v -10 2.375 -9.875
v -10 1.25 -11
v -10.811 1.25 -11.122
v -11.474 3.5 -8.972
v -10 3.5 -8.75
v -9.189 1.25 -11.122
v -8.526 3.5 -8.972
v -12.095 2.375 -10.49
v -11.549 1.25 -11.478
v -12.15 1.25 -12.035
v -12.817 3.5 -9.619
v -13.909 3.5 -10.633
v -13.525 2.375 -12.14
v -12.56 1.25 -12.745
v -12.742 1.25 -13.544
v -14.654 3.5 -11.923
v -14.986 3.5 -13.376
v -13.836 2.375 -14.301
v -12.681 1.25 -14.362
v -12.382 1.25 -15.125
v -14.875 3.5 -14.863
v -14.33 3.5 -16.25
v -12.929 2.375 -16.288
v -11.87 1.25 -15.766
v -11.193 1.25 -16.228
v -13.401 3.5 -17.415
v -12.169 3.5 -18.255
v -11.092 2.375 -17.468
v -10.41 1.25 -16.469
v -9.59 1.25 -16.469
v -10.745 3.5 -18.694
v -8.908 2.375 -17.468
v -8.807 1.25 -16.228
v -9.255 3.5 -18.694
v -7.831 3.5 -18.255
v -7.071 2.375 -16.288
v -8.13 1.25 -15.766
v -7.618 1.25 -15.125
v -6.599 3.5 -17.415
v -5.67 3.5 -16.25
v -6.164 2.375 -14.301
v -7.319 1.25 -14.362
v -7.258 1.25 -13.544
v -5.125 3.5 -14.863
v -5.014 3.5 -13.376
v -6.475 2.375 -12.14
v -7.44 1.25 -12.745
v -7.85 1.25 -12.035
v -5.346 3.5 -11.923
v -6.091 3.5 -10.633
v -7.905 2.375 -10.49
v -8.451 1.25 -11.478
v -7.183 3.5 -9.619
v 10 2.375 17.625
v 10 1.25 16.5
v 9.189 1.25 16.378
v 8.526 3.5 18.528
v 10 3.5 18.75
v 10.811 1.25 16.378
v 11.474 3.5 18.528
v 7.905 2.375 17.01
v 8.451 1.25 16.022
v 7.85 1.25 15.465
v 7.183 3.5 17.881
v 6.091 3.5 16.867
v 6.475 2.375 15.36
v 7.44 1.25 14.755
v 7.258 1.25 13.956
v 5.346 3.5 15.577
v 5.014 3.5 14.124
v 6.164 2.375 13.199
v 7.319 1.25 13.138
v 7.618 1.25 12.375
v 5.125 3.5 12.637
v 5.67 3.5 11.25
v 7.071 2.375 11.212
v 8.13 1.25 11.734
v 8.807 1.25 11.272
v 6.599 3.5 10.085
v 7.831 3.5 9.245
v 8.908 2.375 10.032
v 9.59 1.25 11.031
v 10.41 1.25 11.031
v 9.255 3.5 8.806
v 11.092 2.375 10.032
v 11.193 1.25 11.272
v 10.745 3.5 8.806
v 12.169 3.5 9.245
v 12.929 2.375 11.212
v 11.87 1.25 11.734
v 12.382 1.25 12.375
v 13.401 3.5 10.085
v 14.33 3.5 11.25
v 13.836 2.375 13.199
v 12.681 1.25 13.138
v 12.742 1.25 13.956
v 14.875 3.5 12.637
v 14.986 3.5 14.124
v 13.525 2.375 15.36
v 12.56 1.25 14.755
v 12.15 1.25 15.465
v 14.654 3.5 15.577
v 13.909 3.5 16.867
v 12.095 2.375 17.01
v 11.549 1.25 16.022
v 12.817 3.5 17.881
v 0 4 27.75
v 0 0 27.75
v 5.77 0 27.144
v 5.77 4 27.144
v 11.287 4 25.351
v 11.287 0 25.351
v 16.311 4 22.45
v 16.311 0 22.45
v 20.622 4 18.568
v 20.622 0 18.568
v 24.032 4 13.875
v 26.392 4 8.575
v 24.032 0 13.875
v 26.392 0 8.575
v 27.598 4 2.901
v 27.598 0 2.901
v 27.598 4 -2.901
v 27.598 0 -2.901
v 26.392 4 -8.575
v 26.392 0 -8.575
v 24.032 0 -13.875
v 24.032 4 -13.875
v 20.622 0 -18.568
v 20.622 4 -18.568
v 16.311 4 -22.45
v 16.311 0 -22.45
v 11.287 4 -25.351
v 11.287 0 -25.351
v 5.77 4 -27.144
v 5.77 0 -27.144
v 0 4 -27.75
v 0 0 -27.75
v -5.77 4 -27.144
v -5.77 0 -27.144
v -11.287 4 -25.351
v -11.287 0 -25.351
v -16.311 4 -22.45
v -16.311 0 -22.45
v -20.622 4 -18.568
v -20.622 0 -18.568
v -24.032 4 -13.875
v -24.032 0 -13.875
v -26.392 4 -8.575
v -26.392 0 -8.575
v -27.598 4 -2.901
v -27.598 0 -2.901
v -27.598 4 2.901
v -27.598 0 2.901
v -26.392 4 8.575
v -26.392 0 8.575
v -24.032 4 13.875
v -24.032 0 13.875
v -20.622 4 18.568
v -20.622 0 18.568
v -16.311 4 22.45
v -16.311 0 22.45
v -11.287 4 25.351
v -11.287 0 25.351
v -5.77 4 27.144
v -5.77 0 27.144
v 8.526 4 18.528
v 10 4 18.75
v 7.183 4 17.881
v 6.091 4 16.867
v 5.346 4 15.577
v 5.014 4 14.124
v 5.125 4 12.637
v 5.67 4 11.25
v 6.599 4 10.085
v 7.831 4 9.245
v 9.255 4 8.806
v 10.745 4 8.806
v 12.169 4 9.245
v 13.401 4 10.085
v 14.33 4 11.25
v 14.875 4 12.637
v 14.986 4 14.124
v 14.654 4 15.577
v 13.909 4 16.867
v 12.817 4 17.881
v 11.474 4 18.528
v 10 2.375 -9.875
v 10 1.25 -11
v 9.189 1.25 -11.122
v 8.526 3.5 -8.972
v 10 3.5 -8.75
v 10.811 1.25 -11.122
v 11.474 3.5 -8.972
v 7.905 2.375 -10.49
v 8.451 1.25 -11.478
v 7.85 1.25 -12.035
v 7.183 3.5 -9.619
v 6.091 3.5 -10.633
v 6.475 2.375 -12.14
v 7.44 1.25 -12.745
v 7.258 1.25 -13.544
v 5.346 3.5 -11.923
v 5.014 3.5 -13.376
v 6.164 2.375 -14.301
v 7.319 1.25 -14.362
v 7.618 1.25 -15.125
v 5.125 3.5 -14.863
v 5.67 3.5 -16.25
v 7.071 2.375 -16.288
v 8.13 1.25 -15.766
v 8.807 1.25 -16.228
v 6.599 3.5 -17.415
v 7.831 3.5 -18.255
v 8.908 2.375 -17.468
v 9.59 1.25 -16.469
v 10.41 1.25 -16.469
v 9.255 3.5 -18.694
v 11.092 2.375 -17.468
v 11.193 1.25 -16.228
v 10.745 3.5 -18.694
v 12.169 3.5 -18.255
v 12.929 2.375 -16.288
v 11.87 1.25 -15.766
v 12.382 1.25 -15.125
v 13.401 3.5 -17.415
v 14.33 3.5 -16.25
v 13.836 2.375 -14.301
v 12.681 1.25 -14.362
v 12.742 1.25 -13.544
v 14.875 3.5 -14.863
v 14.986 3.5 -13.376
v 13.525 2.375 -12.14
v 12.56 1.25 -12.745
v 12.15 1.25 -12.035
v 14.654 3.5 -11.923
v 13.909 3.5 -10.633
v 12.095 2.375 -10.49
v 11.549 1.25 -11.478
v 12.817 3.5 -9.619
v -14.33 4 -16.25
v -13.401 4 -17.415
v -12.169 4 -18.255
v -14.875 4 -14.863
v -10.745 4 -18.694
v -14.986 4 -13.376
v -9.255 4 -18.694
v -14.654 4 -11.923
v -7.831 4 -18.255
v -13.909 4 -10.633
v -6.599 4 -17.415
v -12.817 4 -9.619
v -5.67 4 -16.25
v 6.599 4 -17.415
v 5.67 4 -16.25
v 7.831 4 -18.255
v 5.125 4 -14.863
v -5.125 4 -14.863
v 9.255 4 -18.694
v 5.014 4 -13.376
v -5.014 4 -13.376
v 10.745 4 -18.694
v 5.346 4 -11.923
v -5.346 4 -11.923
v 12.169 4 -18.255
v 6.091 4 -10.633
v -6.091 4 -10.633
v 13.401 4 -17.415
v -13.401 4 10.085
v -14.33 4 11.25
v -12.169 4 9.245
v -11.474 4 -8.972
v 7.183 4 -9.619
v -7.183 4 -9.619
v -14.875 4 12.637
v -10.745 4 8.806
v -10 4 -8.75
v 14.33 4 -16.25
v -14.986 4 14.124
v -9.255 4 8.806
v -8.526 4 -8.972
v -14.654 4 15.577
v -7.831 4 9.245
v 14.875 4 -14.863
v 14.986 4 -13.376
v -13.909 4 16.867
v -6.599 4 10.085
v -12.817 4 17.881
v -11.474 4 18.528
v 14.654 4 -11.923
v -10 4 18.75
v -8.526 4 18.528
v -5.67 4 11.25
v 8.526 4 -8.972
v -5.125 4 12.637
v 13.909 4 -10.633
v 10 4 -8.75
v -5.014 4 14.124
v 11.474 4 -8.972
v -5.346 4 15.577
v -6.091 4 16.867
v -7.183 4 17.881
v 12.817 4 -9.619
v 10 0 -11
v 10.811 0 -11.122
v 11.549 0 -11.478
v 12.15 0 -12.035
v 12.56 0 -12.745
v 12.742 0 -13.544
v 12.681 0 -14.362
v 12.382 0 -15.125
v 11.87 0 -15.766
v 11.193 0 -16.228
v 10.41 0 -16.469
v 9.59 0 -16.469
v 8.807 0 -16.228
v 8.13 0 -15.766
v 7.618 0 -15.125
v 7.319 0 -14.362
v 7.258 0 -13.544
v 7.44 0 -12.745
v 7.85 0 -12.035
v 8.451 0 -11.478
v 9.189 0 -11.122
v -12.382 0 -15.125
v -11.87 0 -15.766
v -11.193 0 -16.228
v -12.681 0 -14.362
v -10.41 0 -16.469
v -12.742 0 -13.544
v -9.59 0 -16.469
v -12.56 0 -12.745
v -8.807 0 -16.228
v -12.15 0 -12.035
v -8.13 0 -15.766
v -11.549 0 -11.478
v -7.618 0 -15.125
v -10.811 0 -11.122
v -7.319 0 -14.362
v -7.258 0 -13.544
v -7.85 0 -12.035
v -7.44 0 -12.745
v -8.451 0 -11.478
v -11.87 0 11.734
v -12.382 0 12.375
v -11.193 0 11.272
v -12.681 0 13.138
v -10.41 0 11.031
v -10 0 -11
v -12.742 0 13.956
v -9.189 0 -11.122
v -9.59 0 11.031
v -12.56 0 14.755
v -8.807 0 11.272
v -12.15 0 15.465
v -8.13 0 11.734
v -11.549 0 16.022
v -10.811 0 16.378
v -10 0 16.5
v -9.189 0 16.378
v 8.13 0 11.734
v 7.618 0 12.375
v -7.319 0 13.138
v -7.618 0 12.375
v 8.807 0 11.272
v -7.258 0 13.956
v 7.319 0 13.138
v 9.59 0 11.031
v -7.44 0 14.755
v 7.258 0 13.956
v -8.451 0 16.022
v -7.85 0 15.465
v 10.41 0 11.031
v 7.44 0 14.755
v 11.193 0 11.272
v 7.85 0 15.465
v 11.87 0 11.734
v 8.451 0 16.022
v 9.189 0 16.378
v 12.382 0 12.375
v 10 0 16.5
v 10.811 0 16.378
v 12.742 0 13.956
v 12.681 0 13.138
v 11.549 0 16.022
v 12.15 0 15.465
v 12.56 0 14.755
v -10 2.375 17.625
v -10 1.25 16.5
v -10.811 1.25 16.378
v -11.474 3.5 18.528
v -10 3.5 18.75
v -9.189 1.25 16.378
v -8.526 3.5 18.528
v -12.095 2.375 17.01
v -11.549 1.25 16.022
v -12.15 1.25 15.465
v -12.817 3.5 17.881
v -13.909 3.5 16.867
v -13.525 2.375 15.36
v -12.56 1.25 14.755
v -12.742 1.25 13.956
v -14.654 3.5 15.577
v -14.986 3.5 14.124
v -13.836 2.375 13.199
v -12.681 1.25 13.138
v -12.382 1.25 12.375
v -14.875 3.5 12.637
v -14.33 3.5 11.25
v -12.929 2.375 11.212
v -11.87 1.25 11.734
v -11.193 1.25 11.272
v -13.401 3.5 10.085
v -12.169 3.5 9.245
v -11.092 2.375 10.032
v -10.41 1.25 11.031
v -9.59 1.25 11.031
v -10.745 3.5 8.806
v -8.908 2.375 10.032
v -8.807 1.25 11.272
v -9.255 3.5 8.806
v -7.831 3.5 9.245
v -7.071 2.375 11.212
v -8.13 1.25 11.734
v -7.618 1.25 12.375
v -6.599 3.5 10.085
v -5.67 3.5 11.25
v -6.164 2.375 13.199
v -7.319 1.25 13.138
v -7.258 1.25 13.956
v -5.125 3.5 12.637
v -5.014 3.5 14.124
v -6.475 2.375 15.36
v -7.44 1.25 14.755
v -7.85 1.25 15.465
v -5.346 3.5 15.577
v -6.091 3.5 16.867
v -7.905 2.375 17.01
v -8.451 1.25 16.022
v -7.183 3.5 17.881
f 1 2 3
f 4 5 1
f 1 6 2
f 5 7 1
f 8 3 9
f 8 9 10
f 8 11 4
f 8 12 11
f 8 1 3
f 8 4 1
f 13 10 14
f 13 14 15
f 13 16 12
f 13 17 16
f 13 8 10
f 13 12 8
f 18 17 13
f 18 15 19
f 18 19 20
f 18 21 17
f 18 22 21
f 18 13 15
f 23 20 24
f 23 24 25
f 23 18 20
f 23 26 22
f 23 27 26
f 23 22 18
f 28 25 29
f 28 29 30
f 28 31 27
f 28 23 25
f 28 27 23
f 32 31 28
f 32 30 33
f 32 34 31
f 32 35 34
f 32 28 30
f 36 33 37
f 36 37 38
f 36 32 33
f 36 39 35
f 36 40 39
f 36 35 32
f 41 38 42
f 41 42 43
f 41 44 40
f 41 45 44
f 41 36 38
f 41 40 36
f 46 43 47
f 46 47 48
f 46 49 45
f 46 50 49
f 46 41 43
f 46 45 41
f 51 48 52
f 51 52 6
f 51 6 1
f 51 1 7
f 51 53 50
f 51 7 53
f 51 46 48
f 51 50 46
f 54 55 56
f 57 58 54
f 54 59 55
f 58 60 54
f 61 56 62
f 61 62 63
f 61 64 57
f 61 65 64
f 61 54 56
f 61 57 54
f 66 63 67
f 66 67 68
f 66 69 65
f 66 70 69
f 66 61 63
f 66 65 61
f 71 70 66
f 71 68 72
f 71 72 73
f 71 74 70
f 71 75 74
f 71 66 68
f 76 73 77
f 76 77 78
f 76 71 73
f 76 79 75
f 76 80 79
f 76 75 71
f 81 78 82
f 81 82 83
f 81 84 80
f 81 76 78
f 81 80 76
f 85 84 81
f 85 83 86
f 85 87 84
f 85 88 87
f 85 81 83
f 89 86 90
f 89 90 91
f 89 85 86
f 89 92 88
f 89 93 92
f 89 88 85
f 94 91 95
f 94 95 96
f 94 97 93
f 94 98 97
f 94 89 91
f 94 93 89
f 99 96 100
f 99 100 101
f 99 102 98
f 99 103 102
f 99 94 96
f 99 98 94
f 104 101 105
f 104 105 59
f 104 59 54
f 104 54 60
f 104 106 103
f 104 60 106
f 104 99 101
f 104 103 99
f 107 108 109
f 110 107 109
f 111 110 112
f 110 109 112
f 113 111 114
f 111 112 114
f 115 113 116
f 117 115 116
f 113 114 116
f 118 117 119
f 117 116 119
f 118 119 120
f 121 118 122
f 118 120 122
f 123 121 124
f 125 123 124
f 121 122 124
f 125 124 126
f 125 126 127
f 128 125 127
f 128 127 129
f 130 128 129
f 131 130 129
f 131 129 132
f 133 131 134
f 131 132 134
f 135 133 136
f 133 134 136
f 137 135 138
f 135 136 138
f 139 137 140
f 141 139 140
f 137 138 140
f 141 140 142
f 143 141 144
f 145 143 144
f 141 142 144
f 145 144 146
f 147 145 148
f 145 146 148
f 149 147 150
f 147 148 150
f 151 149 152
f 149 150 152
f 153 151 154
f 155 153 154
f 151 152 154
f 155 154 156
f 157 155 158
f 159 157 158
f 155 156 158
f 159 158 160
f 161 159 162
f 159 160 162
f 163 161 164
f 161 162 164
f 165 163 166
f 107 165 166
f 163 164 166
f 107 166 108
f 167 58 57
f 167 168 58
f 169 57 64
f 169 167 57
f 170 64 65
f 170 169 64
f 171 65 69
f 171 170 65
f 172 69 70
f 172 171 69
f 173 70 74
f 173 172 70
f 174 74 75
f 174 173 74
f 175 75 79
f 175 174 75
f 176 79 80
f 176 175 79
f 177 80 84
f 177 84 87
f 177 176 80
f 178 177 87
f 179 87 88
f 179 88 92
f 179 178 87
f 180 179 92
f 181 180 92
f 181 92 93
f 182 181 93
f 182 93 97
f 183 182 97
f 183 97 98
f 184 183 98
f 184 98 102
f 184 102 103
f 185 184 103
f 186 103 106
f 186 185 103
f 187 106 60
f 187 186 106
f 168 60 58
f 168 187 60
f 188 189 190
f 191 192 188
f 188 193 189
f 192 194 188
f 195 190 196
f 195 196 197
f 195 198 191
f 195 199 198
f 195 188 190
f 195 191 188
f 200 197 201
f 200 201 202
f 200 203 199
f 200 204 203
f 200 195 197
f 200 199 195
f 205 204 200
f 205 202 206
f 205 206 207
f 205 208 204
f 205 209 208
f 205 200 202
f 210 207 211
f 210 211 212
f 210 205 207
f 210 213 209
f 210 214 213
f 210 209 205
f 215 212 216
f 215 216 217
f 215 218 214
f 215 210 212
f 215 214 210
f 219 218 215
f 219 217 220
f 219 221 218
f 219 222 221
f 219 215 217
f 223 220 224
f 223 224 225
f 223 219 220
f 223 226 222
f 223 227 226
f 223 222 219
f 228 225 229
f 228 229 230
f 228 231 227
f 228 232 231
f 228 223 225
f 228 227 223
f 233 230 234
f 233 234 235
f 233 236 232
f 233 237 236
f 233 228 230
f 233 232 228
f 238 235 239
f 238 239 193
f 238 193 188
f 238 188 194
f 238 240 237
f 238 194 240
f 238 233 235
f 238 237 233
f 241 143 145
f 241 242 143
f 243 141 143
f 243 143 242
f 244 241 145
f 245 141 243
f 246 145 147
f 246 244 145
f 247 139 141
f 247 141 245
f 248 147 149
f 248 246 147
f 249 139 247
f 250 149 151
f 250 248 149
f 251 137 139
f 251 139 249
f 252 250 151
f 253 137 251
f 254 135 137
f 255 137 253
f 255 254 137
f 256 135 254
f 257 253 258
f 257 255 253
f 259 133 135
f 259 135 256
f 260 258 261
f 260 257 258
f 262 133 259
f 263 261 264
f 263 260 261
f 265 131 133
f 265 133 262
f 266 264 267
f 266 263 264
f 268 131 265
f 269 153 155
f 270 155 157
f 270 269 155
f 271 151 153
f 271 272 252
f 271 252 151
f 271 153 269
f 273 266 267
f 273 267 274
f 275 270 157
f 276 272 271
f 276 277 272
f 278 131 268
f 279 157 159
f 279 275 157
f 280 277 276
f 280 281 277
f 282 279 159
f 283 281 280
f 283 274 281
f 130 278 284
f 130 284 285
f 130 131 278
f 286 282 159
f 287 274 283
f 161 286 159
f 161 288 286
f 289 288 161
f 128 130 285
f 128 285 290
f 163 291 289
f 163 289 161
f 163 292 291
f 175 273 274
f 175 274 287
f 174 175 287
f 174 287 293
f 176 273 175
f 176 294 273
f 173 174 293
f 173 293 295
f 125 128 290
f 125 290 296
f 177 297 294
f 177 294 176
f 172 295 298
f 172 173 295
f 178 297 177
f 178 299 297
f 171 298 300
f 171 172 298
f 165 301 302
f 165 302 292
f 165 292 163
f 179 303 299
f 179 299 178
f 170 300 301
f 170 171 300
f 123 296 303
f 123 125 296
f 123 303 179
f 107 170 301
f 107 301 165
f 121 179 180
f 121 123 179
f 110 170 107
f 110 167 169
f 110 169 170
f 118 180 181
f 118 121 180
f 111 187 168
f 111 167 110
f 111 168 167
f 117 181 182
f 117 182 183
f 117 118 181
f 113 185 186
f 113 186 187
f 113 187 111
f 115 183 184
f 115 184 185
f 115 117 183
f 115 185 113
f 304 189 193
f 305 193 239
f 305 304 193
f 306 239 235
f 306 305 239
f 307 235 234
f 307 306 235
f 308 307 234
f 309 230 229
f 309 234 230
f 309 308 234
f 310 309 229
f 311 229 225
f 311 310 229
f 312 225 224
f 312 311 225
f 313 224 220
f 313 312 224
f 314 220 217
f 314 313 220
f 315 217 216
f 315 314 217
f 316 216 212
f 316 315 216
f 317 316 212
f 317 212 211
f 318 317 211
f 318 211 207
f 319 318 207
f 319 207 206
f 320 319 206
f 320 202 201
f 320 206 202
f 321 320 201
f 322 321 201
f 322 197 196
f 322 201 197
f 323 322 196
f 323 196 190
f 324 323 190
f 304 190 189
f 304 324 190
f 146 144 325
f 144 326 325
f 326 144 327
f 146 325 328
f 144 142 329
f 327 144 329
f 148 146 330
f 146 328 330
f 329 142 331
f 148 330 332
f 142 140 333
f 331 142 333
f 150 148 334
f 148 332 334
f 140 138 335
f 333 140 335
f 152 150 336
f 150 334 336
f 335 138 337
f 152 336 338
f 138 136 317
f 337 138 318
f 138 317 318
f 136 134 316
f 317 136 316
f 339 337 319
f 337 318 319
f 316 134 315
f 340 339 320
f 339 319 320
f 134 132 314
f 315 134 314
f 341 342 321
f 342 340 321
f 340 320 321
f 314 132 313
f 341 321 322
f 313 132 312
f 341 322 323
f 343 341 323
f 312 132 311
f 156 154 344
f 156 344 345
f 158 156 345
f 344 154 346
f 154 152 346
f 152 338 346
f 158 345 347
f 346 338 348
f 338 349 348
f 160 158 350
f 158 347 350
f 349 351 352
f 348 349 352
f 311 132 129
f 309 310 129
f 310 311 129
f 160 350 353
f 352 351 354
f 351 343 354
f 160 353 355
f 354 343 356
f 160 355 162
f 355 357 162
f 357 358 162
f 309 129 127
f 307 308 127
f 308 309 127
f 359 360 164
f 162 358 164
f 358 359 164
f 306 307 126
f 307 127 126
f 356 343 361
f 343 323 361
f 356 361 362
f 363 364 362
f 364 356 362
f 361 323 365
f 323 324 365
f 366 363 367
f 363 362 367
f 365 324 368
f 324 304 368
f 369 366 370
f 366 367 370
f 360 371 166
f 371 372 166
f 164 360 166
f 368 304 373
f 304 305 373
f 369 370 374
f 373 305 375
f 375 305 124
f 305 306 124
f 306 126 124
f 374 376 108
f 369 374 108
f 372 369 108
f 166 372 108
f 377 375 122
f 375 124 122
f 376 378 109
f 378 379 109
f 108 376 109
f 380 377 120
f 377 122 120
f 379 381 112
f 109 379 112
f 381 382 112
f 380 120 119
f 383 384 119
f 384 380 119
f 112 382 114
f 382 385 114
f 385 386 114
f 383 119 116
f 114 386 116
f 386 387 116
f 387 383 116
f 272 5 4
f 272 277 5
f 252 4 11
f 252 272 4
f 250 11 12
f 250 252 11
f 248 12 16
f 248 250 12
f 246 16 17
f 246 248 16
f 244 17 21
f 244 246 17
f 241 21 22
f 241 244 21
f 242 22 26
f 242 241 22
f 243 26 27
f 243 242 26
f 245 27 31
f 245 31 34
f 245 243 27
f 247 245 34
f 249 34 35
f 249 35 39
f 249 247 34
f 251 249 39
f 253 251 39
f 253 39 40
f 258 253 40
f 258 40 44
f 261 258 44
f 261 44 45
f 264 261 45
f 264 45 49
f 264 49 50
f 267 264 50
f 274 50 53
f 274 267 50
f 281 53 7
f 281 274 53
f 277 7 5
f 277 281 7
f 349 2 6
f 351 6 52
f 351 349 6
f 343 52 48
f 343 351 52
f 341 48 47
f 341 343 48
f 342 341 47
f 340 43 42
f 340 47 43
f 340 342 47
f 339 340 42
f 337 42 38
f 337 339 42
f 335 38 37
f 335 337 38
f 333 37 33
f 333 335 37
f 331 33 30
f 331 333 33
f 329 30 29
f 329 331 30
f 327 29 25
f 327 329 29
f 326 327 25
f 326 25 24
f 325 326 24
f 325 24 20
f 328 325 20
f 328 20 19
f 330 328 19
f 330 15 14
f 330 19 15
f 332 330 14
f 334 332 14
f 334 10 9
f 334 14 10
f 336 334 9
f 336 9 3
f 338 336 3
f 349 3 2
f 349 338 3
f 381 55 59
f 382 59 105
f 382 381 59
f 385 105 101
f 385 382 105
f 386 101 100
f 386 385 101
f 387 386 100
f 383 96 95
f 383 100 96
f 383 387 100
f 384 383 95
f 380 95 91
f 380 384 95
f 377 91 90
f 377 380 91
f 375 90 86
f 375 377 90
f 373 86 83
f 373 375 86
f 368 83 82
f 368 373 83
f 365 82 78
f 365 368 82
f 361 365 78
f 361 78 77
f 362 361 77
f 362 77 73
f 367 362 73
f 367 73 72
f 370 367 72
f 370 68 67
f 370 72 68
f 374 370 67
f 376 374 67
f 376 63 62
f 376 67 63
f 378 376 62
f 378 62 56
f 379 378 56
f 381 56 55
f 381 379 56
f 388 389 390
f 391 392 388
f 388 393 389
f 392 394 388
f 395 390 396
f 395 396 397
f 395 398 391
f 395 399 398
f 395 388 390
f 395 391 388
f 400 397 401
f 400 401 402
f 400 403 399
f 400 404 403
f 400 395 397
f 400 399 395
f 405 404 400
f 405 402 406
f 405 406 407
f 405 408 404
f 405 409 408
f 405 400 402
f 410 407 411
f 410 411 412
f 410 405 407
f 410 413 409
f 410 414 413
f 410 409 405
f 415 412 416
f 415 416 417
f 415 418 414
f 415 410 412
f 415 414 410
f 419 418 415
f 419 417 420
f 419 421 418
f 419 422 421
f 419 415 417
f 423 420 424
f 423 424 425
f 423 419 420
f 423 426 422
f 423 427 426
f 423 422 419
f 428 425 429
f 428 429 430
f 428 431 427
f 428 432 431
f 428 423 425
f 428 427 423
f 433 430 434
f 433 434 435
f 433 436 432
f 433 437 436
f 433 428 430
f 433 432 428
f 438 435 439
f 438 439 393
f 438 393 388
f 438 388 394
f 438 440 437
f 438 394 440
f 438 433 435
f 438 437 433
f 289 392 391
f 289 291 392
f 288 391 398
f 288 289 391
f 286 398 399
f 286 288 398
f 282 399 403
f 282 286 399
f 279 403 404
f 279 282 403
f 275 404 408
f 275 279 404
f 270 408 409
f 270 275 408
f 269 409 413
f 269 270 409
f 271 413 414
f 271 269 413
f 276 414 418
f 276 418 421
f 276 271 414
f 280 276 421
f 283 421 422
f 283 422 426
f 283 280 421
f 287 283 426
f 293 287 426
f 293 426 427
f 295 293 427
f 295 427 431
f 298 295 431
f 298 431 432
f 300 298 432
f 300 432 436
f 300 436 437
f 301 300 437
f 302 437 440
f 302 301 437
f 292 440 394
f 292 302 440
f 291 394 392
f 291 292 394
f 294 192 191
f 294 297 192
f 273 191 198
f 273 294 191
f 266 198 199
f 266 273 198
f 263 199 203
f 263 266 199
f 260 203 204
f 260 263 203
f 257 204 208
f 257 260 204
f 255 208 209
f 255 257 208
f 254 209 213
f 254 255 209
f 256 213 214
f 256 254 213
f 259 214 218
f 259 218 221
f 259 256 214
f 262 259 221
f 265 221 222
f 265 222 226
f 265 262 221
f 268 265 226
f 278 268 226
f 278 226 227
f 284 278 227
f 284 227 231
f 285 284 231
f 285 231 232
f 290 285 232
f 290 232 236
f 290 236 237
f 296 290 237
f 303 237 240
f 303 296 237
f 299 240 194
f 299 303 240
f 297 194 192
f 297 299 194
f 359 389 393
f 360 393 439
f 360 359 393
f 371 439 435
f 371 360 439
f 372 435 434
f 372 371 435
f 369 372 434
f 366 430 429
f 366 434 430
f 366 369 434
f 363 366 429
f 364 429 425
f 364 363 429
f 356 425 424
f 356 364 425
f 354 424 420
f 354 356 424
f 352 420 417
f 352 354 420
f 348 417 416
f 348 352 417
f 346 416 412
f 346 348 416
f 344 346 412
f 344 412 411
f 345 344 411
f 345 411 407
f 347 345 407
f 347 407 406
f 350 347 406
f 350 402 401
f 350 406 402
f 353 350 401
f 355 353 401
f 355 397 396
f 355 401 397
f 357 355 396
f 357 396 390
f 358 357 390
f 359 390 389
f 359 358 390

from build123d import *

# Parameters (mm, degrees)
SKETCH1_R                                      = 27.75
SKETCH1_R_2                                    = 2.75
BOSS_EXTRUDE1_DEPTH                            = 4
CSK_FOR_M5_FLAT_HEAD_MACHINE_SCREW1_AT_2_COUNT = 2
CSK_FOR_M5_FLAT_HEAD_MACHINE_SCREW1_AT_2_PITCH = 27.5
CSK_FOR_M5_FLAT_HEAD_MACHINE_SCREW1_AT_3_COUNT = 2
CSK_FOR_M5_FLAT_HEAD_MACHINE_SCREW1_AT_3_PITCH = 34.003676272
CSK_FOR_M5_FLAT_HEAD_MACHINE_SCREW1_AT_4_COUNT = 2
CSK_FOR_M5_FLAT_HEAD_MACHINE_SCREW1_AT_4_PITCH = 20


with BuildPart() as part:
    # Sketch1 → Boss-Extrude1 (new body)
    with BuildSketch(Plane(origin=(0, 0, 0), x_dir=(1, 0, 0), z_dir=(0, 1, 0))):
        with Locations(Location((0, 0, 0), (0, 0, 270))):
            Circle(SKETCH1_R)
        with Locations(Location((-10, 13.75, 0), (0, 0, 270))):
            Circle(SKETCH1_R_2, mode=Mode.SUBTRACT)
        with Locations(Location((10, 13.75, 0), (0, 0, 270))):
            Circle(SKETCH1_R_2, mode=Mode.SUBTRACT)
        with Locations(Location((10, -13.75, 0), (0, 0, 270))):
            Circle(SKETCH1_R_2, mode=Mode.SUBTRACT)
        with Locations(Location((-10, -13.75, 0), (0, 0, 270))):
            Circle(SKETCH1_R_2, mode=Mode.SUBTRACT)
    extrude(amount=BOSS_EXTRUDE1_DEPTH)

    # Sketch20 → CSK for M5 Flat Head Machine Screw1 (revolve, cut)
    with BuildSketch(Plane(origin=(10, 4, -13.75), x_dir=(0, 0, 1), z_dir=(1, 0, 0))):
        Polygon((0, 0), (0, 4), (2.75, 4), (2.75, 2.75), (5, 0.5), (5, 0), align=None)
    csk_for_m5_flat_head_machine_screw1 = revolve(axis=Axis((10, 10.35, -13.75), (0, -1, 0)), mode=Mode.SUBTRACT)

    # CSK for M5 Flat Head Machine Screw1 at 2: CSK for M5 Flat Head Machine Screw1 ×2
    with Locations(*[(0, 0, i * CSK_FOR_M5_FLAT_HEAD_MACHINE_SCREW1_AT_2_PITCH) for i in range(1, CSK_FOR_M5_FLAT_HEAD_MACHINE_SCREW1_AT_2_COUNT)]):
        add(csk_for_m5_flat_head_machine_screw1, mode=Mode.SUBTRACT)

    # CSK for M5 Flat Head Machine Screw1 at 3: CSK for M5 Flat Head Machine Screw1 ×2
    with Locations(*[Vector(-0.588171697675046, 0, 0.8087360843031888) * (i * CSK_FOR_M5_FLAT_HEAD_MACHINE_SCREW1_AT_3_PITCH) for i in range(1, CSK_FOR_M5_FLAT_HEAD_MACHINE_SCREW1_AT_3_COUNT)]):
        add(csk_for_m5_flat_head_machine_screw1, mode=Mode.SUBTRACT)

    # CSK for M5 Flat Head Machine Screw1 at 4: CSK for M5 Flat Head Machine Screw1 ×2
    with Locations(*[(-i * CSK_FOR_M5_FLAT_HEAD_MACHINE_SCREW1_AT_4_PITCH, 0, 0) for i in range(1, CSK_FOR_M5_FLAT_HEAD_MACHINE_SCREW1_AT_4_COUNT)]):
        add(csk_for_m5_flat_head_machine_screw1, mode=Mode.SUBTRACT)


solid = part.part
